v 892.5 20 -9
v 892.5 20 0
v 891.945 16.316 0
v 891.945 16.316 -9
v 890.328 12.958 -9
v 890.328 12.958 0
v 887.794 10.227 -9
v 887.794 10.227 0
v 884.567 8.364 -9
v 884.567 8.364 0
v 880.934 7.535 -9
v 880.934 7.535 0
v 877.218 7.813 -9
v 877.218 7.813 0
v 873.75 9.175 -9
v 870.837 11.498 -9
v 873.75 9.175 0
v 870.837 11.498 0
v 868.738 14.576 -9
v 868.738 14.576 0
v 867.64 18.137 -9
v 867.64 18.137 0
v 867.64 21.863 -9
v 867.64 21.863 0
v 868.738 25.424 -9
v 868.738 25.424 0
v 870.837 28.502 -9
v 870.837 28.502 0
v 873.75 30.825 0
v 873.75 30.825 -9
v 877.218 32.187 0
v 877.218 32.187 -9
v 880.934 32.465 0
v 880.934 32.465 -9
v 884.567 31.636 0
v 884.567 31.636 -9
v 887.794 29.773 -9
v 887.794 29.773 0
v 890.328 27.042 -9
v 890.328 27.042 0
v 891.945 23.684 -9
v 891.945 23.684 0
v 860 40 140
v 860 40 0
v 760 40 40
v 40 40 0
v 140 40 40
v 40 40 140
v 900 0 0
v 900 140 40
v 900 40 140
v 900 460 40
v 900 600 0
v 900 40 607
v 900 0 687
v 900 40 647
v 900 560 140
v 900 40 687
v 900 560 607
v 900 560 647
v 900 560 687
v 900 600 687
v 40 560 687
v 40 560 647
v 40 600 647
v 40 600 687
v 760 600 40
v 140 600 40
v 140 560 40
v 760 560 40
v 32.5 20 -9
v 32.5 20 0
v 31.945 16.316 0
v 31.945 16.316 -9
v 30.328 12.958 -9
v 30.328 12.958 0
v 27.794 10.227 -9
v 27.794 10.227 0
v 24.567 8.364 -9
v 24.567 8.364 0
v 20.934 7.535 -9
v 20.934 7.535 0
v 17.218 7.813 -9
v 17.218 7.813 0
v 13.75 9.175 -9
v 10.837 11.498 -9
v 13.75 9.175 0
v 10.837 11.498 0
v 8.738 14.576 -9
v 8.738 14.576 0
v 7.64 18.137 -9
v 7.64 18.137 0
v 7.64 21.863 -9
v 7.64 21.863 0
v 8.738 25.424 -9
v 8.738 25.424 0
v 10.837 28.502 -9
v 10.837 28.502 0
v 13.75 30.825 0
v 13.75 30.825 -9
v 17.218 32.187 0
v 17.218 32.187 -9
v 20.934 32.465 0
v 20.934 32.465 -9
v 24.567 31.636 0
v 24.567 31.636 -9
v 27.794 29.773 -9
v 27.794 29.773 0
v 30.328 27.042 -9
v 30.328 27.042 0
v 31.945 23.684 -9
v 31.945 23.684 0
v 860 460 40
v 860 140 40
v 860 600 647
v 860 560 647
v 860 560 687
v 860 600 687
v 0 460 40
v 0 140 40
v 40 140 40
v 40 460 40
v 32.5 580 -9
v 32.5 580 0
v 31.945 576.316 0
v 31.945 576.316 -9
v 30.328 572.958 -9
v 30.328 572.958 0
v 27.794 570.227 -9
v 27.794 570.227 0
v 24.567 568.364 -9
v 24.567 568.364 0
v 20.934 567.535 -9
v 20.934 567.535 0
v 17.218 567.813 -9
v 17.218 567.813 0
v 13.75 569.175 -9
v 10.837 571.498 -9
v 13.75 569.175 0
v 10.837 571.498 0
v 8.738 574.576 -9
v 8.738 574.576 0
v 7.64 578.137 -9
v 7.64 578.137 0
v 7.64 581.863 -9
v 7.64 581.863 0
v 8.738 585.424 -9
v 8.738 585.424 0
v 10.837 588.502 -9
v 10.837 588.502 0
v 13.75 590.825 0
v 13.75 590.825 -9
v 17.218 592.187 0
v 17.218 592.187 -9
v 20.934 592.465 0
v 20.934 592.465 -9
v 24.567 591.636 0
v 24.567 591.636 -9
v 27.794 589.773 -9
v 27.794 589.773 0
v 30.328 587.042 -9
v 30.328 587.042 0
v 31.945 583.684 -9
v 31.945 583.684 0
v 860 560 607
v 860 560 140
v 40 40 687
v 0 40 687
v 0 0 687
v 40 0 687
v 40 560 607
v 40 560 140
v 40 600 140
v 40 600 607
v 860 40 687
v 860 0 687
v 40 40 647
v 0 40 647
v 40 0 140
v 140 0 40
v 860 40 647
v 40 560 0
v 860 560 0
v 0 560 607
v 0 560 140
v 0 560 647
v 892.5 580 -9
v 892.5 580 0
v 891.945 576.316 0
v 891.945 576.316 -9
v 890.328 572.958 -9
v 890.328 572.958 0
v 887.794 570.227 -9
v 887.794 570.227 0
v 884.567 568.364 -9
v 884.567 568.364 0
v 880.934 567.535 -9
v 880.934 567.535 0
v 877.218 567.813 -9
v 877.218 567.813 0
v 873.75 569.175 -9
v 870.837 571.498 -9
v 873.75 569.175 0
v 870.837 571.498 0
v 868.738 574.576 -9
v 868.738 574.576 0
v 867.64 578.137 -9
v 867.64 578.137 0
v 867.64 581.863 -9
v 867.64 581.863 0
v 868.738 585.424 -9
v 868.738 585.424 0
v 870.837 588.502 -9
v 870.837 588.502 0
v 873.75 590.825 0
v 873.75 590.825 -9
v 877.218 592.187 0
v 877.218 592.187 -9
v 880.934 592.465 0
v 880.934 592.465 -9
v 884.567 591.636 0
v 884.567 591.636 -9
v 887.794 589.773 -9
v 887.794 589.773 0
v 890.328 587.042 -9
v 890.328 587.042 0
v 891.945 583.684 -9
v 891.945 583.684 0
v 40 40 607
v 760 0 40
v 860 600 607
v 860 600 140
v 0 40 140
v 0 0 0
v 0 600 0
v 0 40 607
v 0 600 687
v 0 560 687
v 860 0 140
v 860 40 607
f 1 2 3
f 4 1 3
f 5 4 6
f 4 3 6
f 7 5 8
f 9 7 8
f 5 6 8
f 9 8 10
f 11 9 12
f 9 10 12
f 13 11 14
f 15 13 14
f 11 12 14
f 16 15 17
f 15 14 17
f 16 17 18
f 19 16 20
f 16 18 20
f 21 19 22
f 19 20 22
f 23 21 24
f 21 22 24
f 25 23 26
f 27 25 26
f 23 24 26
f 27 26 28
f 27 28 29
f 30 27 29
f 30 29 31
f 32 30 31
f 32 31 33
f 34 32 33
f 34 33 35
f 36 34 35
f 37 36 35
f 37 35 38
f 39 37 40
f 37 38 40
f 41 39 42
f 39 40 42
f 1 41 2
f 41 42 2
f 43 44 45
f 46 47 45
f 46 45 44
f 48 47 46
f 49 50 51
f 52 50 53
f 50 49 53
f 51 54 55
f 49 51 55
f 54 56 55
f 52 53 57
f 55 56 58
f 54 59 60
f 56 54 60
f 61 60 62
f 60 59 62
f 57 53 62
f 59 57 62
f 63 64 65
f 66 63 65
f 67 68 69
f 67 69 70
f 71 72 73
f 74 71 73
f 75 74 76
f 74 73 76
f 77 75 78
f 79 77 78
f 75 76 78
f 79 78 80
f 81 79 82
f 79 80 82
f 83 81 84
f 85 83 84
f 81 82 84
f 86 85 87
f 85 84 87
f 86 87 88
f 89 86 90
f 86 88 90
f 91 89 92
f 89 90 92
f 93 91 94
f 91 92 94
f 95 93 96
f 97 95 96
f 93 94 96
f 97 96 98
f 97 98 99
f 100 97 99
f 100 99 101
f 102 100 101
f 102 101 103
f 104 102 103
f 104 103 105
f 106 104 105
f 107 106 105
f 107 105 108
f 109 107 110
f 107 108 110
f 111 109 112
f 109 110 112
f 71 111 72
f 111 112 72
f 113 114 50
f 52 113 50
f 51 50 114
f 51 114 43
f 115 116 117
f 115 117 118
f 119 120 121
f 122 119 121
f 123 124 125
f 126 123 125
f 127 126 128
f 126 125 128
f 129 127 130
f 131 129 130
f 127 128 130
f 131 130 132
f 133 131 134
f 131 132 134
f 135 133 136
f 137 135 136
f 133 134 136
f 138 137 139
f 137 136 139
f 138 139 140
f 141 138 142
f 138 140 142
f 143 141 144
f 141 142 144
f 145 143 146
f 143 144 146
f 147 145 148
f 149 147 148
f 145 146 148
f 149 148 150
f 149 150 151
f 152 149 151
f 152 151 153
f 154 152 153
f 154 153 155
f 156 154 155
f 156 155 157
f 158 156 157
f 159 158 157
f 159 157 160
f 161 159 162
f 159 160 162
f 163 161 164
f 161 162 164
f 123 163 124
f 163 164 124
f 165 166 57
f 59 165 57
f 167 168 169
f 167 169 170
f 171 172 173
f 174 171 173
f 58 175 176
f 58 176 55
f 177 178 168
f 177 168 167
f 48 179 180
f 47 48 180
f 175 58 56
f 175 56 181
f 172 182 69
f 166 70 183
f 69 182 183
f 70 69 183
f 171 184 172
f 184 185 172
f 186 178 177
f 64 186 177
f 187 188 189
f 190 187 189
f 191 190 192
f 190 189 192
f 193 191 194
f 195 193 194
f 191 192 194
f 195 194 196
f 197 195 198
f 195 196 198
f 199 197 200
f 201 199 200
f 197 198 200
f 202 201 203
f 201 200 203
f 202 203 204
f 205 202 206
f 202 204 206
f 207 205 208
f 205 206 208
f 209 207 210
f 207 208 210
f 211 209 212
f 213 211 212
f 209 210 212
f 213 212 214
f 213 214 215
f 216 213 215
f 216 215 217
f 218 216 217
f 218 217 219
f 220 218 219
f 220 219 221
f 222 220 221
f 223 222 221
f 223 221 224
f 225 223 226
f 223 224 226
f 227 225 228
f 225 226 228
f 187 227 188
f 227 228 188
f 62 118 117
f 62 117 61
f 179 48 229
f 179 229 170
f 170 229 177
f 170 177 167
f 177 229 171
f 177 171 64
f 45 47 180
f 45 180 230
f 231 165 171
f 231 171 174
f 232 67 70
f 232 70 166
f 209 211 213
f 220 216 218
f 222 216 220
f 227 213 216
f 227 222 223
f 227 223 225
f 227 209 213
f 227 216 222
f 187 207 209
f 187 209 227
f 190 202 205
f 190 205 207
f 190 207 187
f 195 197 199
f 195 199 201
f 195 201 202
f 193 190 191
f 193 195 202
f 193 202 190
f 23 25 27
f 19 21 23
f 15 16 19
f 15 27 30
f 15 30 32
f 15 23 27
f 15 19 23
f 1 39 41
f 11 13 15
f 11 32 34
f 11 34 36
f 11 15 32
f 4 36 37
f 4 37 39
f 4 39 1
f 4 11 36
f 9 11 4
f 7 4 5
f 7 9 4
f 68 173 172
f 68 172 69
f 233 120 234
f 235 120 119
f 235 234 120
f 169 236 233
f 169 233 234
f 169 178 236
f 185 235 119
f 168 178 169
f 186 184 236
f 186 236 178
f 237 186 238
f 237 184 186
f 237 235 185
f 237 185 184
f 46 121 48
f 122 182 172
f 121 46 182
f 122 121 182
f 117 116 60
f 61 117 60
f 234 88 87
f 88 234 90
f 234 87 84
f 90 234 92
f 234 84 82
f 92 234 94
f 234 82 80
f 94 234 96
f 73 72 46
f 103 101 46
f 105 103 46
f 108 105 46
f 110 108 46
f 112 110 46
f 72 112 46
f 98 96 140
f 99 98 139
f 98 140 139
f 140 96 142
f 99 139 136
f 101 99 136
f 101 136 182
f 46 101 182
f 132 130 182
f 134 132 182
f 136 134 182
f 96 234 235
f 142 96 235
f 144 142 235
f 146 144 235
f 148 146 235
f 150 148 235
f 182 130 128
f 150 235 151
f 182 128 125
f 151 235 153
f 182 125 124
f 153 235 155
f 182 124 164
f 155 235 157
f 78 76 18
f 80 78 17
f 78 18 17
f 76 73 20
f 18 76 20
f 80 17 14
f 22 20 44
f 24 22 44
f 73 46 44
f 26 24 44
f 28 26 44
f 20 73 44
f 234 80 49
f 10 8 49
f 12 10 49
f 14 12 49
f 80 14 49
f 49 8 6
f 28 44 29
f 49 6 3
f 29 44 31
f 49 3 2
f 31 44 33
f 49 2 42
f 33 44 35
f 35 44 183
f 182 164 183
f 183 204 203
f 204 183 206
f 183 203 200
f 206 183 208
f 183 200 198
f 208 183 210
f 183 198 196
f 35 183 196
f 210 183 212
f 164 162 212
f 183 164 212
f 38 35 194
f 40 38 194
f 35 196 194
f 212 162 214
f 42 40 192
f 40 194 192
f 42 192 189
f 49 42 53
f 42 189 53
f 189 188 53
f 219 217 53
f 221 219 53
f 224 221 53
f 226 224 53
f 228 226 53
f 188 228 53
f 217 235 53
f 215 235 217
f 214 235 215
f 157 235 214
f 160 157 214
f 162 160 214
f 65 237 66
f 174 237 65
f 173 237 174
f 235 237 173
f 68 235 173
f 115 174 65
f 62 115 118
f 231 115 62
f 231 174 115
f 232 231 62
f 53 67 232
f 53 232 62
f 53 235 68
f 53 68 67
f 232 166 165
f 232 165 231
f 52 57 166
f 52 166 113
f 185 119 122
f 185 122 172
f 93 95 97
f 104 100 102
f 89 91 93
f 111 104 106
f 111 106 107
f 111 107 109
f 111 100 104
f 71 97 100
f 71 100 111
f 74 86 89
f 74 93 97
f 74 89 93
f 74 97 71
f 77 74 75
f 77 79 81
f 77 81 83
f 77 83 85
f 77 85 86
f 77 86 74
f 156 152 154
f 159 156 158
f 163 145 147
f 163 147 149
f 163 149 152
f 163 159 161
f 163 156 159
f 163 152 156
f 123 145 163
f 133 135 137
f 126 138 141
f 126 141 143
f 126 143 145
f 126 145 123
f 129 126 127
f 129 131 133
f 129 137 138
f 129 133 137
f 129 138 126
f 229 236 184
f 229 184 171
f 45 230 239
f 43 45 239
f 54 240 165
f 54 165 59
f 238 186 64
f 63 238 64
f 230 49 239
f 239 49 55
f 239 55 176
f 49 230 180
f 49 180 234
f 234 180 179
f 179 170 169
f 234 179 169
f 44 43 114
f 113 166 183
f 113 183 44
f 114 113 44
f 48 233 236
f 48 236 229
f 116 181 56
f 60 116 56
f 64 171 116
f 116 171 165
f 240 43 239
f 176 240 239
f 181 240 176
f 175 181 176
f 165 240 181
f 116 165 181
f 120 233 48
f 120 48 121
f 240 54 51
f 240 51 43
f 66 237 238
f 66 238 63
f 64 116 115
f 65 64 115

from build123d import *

# Parameters (mm, degrees)
SKETCH1_W            = 40
SKETCH1_H            = 40
BOSS_EXTRUDE1_DEPTH  = 687
SKETCH1_4_W          = 40
SKETCH1_4_H          = 40
BOSS_EXTRUDE2_DEPTH  = 687
SKETCH1_5_W          = 40
SKETCH1_5_H          = 40
BOSS_EXTRUDE3_DEPTH  = 687
SKETCH1_6_W          = 40
SKETCH1_6_H          = 40
BOSS_EXTRUDE4_DEPTH  = 687
SKETCH1_7_W          = 820
SKETCH1_7_H          = 40
BOSS_EXTRUDE5_DEPTH  = 40
SKETCH1_8_W          = 40
SKETCH1_8_H          = 520
BOSS_EXTRUDE6_DEPTH  = 40
SKETCH1_9_W          = 820
SKETCH1_9_H          = 40
BOSS_EXTRUDE7_DEPTH  = 40
SKETCH1_10_W         = 40
SKETCH1_10_H         = 520
BOSS_EXTRUDE8_DEPTH  = 40
BOSS_EXTRUDE9_DEPTH  = 40
BOSS_EXTRUDE10_DEPTH = 40
BOSS_EXTRUDE11_DEPTH = 40
BOSS_EXTRUDE12_DEPTH = 40
SKETCH6_W            = 40
SKETCH6_H            = 40
BOSS_EXTRUDE13_DEPTH = 820
SKETCH7_W            = 40
SKETCH7_H            = 40
BOSS_EXTRUDE14_DEPTH = 520
SKETCH8_W            = 40
SKETCH8_H            = 40
BOSS_EXTRUDE15_DEPTH = 520
SKETCH9_R            = 12.5
BOSS_EXTRUDE16_DEPTH = 9


with BuildPart() as part:
    # Sketch1 → Boss-Extrude1 (new body)
    with BuildSketch(Plane.XY):
        with Locations((20, 580)):
            Rectangle(SKETCH1_W, SKETCH1_H)
    extrude(amount=BOSS_EXTRUDE1_DEPTH)



with BuildPart() as body_2:
    # Sketch1<4> → Boss-Extrude2 (new body)
    with BuildSketch(Plane.XY):
        with Locations((880, 580)):
            Rectangle(SKETCH1_4_W, SKETCH1_4_H)
    extrude(amount=BOSS_EXTRUDE2_DEPTH)


with BuildPart() as body_3:
    # Sketch1<5> → Boss-Extrude3 (new body)
    with BuildSketch(Plane.XY):
        with Locations((20, 20)):
            Rectangle(SKETCH1_5_W, SKETCH1_5_H)
    extrude(amount=BOSS_EXTRUDE3_DEPTH)


with BuildPart() as body_4:
    # Sketch1<6> → Boss-Extrude4 (new body)
    with BuildSketch(Plane.XY):
        with Locations((880, 20)):
            Rectangle(SKETCH1_6_W, SKETCH1_6_H)
    extrude(amount=BOSS_EXTRUDE4_DEPTH)


with BuildPart() as part_1:
    add(part.part)

    add(body_2.part)  # Boss-Extrude5 merges body 2
    # Sketch1<7> → Boss-Extrude5 (add)
    with BuildSketch(Plane.XY):
        with Locations((450, 580)):
            Rectangle(SKETCH1_7_W, SKETCH1_7_H)
    extrude(amount=BOSS_EXTRUDE5_DEPTH)


    add(body_3.part)  # Boss-Extrude6 merges body 3
    # Sketch1<8> → Boss-Extrude6 (add)
    with BuildSketch(Plane.XY):
        with Locations((20, 300)):
            Rectangle(SKETCH1_8_W, SKETCH1_8_H)
    extrude(amount=BOSS_EXTRUDE6_DEPTH)


    add(body_4.part)  # Boss-Extrude7 merges body 4
    # Sketch1<9> → Boss-Extrude7 (add)
    with BuildSketch(Plane.XY):
        with Locations((450, 20)):
            Rectangle(SKETCH1_9_W, SKETCH1_9_H)
    extrude(amount=BOSS_EXTRUDE7_DEPTH)

    # Sketch1<10> → Boss-Extrude8 (add)
    with BuildSketch(Plane.XY):
        with Locations((880, 300)):
            Rectangle(SKETCH1_10_W, SKETCH1_10_H)
    extrude(amount=BOSS_EXTRUDE8_DEPTH)

    # Sketch2 → Boss-Extrude9 (add)
    with BuildSketch(Plane(origin=(0, 600, 0), x_dir=(1, 0, 0), z_dir=(0, 1, 0))):
        Polygon((40, -140), (140, -40), (40, -40), align=None)
        Polygon((760, -40), (860, -140), (860, -40), align=None)
    extrude(amount=-BOSS_EXTRUDE9_DEPTH)

    # Sketch3 → Boss-Extrude10 (add)
    with BuildSketch(Plane.ZY):
        Polygon((40, 560), (40, 460), (140, 560), align=None)
        Polygon((40, 140), (40, 40), (140, 40), align=None)
    extrude(amount=-BOSS_EXTRUDE10_DEPTH)

    # Sketch4 → Boss-Extrude11 (add)
    with BuildSketch(Plane.XZ):
        Polygon((40, 140), (140, 40), (40, 40), align=None)
        Polygon((760, 40), (860, 140), (860, 40), align=None)
    extrude(amount=-BOSS_EXTRUDE11_DEPTH)

    # Sketch5 → Boss-Extrude12 (add)
    with BuildSketch(Plane(origin=(900, 0, 0), x_dir=(0, 0, -1), z_dir=(1, 0, 0))):
        Polygon((-140, 560), (-40, 460), (-40, 560), align=None)
        Polygon((-140, 40), (-40, 40), (-40, 140), align=None)
    extrude(amount=-BOSS_EXTRUDE12_DEPTH)

    # Sketch6 → Boss-Extrude13 (add)
    with BuildSketch(Plane.ZY.offset(-860)):
        with Locations((627, 580)):
            Rectangle(SKETCH6_W, SKETCH6_H)
    extrude(amount=BOSS_EXTRUDE13_DEPTH)

    # Sketch7 → Boss-Extrude14 (add)
    with BuildSketch(Plane.XZ.offset(-560)):
        with Locations((20, 627)):
            Rectangle(SKETCH7_W, SKETCH7_H)
    extrude(amount=BOSS_EXTRUDE14_DEPTH)

    # Sketch8 → Boss-Extrude15 (add)
    with BuildSketch(Plane.XZ.offset(-560)):
        with Locations((880, 627)):
            Rectangle(SKETCH8_W, SKETCH8_H)
    extrude(amount=BOSS_EXTRUDE15_DEPTH)

    # Sketch9 → Boss-Extrude16 (add)
    with BuildSketch(Plane(origin=(0, 0, 0), x_dir=(-1, 0, 0), z_dir=(0, 0, -1))):
        with Locations((-880, 580)):
            Circle(SKETCH9_R)
        with Locations((-880, 20)):
            Circle(SKETCH9_R)
        with Locations((-20, 580)):
            Circle(SKETCH9_R)
        with Locations((-20, 20)):
            Circle(SKETCH9_R)
    extrude(amount=BOSS_EXTRUDE16_DEPTH)


solid = part_1.part
